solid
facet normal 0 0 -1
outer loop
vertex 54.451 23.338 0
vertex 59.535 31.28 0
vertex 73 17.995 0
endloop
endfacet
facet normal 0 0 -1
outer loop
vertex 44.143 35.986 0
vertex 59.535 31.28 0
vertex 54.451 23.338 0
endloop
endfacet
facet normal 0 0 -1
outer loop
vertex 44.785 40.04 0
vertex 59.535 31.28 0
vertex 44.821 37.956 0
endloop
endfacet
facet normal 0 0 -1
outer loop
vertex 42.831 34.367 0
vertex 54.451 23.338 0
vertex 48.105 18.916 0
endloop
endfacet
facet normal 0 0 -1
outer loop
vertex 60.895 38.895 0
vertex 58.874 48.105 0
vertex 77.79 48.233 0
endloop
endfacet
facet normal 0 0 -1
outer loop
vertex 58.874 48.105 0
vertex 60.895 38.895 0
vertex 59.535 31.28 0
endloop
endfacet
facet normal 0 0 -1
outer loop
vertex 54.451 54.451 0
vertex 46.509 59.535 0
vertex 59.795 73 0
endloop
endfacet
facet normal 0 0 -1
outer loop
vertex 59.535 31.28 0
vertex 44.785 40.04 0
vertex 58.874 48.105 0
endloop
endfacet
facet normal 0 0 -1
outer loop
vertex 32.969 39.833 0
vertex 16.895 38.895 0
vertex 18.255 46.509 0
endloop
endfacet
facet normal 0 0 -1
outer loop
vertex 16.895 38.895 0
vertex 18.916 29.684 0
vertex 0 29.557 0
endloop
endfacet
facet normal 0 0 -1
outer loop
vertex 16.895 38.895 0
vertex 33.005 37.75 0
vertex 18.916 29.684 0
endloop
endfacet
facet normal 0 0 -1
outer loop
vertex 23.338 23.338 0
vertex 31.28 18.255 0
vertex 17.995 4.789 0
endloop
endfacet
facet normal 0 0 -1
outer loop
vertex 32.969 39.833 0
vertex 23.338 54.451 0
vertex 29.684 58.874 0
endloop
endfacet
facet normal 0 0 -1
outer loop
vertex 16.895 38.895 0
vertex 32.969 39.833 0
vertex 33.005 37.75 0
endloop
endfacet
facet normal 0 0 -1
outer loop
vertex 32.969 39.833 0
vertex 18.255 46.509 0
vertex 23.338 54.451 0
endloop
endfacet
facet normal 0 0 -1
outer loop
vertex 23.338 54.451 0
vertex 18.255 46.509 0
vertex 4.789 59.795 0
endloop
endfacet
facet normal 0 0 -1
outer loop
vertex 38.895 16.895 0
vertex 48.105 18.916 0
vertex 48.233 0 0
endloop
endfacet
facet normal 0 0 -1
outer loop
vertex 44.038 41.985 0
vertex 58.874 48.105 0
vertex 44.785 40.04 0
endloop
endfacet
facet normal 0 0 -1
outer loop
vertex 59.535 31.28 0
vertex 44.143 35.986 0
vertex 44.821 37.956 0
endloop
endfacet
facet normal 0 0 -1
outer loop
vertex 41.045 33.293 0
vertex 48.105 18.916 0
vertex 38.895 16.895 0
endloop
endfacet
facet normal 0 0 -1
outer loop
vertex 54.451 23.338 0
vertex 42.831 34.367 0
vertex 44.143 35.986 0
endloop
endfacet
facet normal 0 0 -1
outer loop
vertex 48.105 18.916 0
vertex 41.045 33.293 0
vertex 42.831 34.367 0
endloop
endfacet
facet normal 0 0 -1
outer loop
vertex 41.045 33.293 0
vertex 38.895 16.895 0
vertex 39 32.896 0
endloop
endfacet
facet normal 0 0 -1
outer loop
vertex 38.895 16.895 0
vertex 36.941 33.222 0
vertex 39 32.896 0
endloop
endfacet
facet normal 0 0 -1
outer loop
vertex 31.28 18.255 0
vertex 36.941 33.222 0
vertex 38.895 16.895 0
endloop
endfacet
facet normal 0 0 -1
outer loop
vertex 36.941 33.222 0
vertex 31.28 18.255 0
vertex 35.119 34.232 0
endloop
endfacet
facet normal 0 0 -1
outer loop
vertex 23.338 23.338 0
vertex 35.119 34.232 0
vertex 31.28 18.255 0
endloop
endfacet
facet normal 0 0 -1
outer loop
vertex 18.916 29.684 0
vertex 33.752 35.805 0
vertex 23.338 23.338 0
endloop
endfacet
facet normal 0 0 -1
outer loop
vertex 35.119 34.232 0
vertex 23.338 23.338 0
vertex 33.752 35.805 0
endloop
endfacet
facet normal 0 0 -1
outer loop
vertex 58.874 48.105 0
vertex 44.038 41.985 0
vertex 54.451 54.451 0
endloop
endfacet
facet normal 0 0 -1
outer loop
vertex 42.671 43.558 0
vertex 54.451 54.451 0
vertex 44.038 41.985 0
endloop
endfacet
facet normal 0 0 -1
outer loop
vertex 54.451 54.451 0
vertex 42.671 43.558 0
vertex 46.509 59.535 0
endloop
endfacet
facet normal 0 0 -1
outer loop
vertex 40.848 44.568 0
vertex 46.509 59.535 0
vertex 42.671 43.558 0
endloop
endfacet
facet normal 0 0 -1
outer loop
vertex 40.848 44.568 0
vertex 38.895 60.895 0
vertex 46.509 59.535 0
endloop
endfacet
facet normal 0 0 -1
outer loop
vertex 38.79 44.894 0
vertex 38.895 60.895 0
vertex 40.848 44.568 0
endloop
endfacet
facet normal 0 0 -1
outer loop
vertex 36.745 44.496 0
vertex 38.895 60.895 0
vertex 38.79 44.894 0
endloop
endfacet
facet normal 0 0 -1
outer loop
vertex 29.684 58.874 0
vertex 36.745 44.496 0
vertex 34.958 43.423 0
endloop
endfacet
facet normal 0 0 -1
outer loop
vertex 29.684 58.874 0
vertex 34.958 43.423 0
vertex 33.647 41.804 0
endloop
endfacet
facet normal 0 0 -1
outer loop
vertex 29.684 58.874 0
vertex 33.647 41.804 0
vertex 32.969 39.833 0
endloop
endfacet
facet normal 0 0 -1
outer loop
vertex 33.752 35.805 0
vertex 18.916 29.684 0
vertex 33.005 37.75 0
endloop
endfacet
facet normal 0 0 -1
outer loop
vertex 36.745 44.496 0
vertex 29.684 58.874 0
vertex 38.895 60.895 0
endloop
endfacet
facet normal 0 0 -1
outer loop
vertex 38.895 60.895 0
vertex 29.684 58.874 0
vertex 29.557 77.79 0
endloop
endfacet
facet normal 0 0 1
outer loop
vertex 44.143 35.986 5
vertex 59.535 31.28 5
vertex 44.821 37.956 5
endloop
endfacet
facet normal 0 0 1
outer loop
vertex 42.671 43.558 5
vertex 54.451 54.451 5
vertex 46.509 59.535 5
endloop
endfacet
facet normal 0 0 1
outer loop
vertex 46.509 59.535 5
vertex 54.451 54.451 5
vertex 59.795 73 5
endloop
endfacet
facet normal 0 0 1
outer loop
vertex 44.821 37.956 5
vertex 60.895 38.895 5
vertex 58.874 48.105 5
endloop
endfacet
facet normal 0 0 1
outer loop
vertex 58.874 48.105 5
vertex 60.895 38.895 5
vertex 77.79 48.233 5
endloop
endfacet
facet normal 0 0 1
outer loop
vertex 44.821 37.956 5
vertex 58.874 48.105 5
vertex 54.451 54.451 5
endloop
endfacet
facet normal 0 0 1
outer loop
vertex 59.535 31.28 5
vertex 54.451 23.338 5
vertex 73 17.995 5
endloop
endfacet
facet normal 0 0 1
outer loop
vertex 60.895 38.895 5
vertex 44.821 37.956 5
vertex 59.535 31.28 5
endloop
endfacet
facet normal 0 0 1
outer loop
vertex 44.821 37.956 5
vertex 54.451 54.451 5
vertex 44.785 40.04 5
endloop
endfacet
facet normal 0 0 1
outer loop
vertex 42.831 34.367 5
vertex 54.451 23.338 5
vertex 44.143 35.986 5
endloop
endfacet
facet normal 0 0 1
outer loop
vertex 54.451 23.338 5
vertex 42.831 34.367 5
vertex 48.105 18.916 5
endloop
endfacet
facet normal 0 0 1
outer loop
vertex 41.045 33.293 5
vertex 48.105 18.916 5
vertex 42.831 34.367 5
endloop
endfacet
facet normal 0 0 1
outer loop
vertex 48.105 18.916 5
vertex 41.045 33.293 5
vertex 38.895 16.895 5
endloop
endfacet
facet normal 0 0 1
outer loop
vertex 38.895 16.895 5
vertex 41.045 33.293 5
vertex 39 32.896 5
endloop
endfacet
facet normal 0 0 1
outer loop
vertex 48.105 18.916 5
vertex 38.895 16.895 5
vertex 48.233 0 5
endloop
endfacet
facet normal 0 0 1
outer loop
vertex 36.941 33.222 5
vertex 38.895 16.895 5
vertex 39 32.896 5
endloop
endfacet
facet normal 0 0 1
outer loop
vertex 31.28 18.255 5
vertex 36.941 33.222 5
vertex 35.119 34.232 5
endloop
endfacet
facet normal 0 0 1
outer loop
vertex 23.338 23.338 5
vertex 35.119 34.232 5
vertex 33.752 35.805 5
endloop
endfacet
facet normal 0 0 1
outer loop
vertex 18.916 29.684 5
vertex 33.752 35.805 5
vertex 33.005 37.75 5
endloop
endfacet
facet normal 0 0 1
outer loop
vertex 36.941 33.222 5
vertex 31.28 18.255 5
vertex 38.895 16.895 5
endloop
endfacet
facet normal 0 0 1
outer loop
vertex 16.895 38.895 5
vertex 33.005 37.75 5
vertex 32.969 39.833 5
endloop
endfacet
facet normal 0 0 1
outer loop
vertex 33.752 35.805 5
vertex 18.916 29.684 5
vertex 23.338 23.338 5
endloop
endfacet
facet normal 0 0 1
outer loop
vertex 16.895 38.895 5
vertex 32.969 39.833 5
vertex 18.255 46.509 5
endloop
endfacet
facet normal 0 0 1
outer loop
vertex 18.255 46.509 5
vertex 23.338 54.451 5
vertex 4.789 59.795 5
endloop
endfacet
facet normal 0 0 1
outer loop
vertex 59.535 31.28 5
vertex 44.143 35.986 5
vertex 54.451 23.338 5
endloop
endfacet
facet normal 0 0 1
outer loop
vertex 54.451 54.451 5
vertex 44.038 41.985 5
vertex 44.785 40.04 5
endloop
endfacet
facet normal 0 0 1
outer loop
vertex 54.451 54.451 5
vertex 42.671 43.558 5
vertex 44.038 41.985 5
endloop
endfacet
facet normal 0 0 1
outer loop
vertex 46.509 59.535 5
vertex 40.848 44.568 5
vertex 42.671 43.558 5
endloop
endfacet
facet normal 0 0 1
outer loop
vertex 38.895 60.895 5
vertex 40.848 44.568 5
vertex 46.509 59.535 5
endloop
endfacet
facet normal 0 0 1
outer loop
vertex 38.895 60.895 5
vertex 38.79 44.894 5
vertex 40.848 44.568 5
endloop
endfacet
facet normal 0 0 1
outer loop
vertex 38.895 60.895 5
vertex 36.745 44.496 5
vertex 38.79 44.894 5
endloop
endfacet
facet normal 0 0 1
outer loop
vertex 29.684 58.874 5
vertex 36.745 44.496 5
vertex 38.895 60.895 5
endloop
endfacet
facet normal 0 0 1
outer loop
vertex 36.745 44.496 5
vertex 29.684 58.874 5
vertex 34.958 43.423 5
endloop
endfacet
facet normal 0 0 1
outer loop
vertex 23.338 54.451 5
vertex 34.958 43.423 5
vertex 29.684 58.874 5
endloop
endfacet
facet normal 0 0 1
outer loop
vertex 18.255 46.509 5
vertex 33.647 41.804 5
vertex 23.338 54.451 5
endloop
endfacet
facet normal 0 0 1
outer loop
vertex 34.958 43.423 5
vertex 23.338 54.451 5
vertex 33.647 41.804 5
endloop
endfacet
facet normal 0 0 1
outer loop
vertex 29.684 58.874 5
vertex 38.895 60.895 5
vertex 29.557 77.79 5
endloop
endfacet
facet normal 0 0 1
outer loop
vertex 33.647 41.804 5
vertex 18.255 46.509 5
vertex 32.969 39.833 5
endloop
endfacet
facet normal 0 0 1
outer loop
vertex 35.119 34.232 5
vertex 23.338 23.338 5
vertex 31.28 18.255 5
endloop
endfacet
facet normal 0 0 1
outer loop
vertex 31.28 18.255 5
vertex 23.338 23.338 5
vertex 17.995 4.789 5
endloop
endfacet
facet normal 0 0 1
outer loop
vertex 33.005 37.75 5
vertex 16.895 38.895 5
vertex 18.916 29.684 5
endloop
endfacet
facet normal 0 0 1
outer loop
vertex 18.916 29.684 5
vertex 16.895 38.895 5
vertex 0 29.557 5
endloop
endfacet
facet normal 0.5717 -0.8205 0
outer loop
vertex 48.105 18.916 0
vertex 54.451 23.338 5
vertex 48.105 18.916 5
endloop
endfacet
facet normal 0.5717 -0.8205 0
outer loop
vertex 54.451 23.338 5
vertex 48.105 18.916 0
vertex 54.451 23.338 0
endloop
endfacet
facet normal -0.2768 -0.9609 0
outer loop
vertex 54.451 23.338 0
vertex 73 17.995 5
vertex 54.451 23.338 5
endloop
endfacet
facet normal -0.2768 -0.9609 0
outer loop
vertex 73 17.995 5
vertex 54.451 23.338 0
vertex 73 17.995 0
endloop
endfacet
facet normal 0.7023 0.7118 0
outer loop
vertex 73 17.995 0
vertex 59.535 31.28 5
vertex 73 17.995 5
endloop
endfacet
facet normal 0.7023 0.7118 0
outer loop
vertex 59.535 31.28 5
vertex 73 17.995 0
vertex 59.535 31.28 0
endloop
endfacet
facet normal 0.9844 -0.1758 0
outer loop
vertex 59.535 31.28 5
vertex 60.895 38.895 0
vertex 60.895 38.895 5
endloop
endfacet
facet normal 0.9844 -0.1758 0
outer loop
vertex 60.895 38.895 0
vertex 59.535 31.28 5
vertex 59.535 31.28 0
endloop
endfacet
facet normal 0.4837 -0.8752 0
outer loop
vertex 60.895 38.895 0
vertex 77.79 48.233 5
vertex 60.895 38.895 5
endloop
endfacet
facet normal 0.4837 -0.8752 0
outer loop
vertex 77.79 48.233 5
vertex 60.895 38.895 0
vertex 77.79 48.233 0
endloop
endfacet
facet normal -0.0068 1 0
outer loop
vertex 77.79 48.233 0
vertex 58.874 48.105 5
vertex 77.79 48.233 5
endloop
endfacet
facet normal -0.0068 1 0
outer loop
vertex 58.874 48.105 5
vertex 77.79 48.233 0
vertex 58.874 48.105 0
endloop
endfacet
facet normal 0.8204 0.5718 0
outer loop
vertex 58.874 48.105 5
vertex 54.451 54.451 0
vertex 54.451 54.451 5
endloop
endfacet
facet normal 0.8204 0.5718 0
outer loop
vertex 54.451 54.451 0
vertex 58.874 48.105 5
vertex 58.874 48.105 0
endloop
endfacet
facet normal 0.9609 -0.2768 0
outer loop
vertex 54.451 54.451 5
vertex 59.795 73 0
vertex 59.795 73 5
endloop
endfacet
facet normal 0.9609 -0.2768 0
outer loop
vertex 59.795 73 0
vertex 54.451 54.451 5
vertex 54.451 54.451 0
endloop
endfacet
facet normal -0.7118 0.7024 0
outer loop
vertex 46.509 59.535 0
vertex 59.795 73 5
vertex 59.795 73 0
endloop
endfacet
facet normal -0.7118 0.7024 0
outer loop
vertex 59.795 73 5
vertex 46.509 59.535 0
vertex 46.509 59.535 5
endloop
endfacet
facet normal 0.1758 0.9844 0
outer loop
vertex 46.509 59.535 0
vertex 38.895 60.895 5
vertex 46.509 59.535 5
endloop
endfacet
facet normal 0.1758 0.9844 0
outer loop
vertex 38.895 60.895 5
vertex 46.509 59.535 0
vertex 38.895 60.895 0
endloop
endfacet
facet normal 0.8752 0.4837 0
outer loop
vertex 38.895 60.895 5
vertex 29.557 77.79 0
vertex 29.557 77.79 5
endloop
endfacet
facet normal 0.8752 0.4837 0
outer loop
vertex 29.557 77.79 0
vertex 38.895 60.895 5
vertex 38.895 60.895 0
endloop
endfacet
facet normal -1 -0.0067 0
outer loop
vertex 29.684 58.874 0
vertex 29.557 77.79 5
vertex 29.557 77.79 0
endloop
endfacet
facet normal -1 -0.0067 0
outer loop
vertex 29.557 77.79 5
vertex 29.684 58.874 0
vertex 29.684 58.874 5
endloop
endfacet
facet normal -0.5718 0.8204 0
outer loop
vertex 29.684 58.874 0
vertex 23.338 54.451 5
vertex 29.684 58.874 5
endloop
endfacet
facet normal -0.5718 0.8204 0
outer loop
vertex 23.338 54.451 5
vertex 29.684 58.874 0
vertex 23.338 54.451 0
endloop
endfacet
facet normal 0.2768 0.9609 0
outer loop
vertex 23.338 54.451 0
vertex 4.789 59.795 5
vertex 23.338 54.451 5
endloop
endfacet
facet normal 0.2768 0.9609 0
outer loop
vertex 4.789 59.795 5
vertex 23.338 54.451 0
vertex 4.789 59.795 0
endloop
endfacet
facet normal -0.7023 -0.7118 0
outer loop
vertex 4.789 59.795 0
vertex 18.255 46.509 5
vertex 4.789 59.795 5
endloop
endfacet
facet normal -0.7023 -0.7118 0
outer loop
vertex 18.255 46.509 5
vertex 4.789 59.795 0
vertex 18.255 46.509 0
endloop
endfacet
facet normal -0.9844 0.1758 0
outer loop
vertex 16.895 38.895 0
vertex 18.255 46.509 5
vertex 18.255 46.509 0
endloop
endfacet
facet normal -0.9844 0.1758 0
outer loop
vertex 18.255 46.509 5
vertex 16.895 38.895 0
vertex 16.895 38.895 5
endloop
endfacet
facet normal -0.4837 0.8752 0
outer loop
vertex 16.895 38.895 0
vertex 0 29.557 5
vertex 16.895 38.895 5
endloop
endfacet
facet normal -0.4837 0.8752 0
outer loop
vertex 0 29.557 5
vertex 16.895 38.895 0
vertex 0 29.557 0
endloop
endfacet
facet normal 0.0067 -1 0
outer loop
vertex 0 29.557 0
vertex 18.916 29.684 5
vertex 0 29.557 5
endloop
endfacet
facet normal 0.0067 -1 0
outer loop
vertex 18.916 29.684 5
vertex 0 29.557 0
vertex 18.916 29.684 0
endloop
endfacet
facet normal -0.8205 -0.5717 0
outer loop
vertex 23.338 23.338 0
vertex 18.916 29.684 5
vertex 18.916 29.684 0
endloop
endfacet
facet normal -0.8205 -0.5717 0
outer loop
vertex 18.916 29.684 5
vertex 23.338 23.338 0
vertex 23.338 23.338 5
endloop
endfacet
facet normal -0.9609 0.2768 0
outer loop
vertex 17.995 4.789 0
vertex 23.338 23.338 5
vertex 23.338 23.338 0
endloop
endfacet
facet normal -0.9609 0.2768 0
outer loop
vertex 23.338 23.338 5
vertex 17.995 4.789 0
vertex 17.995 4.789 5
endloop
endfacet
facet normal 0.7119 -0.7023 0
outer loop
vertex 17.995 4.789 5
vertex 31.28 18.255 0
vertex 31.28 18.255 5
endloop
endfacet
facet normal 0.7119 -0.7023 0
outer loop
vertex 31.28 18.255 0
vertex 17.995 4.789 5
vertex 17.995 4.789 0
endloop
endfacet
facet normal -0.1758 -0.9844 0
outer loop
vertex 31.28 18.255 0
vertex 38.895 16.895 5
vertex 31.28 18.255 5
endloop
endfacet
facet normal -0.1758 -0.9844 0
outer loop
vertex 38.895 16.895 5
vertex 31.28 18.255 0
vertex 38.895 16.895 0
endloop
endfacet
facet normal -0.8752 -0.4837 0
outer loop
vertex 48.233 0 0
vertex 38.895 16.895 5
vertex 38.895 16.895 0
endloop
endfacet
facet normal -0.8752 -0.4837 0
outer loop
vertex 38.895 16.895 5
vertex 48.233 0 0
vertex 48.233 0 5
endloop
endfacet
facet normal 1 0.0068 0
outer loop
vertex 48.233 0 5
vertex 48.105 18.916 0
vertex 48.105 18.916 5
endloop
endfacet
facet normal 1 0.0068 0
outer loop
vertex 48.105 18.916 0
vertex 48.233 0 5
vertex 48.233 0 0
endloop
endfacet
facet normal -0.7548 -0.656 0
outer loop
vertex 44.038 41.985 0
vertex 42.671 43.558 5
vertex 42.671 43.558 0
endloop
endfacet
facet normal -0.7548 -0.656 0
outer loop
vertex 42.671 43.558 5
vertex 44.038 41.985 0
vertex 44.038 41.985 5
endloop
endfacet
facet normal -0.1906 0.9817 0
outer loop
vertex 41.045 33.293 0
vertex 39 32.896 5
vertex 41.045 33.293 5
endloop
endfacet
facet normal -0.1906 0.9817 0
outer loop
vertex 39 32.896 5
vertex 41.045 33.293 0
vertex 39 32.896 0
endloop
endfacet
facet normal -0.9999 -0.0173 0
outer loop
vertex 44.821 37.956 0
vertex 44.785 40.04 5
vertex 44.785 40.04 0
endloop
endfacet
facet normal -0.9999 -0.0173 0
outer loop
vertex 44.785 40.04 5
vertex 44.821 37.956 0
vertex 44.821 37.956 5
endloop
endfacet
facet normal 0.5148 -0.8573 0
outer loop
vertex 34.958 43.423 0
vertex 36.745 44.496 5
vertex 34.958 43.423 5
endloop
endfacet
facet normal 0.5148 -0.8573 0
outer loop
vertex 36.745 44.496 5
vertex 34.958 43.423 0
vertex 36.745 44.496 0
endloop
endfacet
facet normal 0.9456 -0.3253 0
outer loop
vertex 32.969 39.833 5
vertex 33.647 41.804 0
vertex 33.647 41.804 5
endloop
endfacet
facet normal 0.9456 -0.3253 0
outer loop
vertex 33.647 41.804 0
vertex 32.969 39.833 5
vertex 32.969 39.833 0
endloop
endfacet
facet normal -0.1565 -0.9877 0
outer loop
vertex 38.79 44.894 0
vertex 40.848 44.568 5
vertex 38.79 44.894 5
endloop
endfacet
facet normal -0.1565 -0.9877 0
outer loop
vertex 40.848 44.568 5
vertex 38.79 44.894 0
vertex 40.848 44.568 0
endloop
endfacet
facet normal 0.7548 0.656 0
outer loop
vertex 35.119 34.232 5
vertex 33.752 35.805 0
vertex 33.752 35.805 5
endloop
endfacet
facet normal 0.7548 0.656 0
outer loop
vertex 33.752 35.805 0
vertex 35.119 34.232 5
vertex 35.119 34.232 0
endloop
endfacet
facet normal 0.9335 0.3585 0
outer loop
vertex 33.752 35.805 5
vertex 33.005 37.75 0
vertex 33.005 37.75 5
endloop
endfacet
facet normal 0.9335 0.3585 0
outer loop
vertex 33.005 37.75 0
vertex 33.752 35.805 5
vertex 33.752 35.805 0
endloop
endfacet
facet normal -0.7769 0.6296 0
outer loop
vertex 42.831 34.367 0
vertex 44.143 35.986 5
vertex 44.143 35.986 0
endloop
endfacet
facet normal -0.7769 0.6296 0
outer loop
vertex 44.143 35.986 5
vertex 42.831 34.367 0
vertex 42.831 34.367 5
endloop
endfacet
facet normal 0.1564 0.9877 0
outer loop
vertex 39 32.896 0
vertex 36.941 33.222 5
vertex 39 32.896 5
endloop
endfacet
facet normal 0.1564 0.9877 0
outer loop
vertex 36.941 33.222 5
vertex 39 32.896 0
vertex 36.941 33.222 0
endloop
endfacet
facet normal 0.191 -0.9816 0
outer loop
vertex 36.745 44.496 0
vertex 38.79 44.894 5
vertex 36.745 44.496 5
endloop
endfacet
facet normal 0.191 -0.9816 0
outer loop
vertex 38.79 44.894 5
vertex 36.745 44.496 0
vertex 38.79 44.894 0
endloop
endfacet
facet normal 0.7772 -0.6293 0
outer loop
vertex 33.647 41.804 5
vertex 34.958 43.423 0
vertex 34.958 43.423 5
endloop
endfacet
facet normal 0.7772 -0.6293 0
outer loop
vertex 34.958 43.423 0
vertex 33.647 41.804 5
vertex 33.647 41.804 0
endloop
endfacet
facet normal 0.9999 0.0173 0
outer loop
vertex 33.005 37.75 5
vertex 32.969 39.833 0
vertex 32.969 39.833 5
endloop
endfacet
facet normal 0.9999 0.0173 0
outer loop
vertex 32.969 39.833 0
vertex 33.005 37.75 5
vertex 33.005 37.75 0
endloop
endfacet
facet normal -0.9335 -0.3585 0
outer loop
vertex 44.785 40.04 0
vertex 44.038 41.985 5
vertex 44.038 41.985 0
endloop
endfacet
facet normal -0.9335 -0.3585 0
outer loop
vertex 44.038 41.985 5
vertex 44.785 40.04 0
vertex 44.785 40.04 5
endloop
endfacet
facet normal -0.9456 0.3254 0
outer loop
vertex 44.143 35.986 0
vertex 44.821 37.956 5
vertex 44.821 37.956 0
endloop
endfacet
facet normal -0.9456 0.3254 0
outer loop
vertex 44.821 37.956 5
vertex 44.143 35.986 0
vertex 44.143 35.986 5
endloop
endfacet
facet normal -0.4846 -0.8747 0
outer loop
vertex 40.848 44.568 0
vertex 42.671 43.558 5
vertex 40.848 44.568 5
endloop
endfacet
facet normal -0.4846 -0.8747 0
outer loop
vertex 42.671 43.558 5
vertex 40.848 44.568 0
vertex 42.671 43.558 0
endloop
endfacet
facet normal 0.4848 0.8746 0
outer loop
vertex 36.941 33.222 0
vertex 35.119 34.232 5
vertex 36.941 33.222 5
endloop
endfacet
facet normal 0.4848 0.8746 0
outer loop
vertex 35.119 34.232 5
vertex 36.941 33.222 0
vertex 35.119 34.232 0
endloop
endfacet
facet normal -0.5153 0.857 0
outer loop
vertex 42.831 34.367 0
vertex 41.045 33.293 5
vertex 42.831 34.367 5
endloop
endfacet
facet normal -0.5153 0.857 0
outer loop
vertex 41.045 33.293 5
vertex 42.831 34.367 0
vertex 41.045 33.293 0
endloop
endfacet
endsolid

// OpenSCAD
$fn = 32;

// ----------------------------------------------------------------------
// Star wheel: 8-point ratchet, R40
// ----------------------------------------------------------------------

// --- parameters (mm) ---
n_points = 8;             // number of points / teeth
r_out = 40;               // tip radius
r_in = 22;                // root radius
bore_r = 6;               // centre bore radius
plate_t = 5;              // plate thickness, Z (extrusion height)
bore_d = 12;              // centre bore diameter

profile = [[16.895, 38.895], [0, 29.557], [18.916, 29.684], [23.338, 23.338], [17.995, 4.789], [31.28, 18.255], [38.895, 16.895], [48.233, 0], [48.105, 18.916], [54.451, 23.338], [73, 17.995], [59.535, 31.28], [60.895, 38.895], [77.79, 48.233], [58.874, 48.105], [54.451, 54.451], [59.795, 73], [46.509, 59.535], [38.895, 60.895], [29.557, 77.79], [29.684, 58.874], [23.338, 54.451], [4.789, 59.795], [18.255, 46.509]];  // primary outline, 24 points, counter clockwise
void_1 = [[44.785, 40.04], [44.038, 41.985], [42.671, 43.558], [40.848, 44.568], [38.79, 44.894], [36.745, 44.496], [34.958, 43.423], [33.647, 41.804], [32.969, 39.833], [33.005, 37.75], [33.752, 35.805], [35.119, 34.232], [36.941, 33.222], [39, 32.896], [41.045, 33.293], [42.831, 34.367], [44.143, 35.986], [44.821, 37.956]];  // centre bore, 18 points

// --- the one profile operation ---
difference() {
  linear_extrude(height = plate_t) polygon(points = profile);
  translate([0, 0, -1])
    linear_extrude(height = plate_t + 2) polygon(points = void_1);
}
